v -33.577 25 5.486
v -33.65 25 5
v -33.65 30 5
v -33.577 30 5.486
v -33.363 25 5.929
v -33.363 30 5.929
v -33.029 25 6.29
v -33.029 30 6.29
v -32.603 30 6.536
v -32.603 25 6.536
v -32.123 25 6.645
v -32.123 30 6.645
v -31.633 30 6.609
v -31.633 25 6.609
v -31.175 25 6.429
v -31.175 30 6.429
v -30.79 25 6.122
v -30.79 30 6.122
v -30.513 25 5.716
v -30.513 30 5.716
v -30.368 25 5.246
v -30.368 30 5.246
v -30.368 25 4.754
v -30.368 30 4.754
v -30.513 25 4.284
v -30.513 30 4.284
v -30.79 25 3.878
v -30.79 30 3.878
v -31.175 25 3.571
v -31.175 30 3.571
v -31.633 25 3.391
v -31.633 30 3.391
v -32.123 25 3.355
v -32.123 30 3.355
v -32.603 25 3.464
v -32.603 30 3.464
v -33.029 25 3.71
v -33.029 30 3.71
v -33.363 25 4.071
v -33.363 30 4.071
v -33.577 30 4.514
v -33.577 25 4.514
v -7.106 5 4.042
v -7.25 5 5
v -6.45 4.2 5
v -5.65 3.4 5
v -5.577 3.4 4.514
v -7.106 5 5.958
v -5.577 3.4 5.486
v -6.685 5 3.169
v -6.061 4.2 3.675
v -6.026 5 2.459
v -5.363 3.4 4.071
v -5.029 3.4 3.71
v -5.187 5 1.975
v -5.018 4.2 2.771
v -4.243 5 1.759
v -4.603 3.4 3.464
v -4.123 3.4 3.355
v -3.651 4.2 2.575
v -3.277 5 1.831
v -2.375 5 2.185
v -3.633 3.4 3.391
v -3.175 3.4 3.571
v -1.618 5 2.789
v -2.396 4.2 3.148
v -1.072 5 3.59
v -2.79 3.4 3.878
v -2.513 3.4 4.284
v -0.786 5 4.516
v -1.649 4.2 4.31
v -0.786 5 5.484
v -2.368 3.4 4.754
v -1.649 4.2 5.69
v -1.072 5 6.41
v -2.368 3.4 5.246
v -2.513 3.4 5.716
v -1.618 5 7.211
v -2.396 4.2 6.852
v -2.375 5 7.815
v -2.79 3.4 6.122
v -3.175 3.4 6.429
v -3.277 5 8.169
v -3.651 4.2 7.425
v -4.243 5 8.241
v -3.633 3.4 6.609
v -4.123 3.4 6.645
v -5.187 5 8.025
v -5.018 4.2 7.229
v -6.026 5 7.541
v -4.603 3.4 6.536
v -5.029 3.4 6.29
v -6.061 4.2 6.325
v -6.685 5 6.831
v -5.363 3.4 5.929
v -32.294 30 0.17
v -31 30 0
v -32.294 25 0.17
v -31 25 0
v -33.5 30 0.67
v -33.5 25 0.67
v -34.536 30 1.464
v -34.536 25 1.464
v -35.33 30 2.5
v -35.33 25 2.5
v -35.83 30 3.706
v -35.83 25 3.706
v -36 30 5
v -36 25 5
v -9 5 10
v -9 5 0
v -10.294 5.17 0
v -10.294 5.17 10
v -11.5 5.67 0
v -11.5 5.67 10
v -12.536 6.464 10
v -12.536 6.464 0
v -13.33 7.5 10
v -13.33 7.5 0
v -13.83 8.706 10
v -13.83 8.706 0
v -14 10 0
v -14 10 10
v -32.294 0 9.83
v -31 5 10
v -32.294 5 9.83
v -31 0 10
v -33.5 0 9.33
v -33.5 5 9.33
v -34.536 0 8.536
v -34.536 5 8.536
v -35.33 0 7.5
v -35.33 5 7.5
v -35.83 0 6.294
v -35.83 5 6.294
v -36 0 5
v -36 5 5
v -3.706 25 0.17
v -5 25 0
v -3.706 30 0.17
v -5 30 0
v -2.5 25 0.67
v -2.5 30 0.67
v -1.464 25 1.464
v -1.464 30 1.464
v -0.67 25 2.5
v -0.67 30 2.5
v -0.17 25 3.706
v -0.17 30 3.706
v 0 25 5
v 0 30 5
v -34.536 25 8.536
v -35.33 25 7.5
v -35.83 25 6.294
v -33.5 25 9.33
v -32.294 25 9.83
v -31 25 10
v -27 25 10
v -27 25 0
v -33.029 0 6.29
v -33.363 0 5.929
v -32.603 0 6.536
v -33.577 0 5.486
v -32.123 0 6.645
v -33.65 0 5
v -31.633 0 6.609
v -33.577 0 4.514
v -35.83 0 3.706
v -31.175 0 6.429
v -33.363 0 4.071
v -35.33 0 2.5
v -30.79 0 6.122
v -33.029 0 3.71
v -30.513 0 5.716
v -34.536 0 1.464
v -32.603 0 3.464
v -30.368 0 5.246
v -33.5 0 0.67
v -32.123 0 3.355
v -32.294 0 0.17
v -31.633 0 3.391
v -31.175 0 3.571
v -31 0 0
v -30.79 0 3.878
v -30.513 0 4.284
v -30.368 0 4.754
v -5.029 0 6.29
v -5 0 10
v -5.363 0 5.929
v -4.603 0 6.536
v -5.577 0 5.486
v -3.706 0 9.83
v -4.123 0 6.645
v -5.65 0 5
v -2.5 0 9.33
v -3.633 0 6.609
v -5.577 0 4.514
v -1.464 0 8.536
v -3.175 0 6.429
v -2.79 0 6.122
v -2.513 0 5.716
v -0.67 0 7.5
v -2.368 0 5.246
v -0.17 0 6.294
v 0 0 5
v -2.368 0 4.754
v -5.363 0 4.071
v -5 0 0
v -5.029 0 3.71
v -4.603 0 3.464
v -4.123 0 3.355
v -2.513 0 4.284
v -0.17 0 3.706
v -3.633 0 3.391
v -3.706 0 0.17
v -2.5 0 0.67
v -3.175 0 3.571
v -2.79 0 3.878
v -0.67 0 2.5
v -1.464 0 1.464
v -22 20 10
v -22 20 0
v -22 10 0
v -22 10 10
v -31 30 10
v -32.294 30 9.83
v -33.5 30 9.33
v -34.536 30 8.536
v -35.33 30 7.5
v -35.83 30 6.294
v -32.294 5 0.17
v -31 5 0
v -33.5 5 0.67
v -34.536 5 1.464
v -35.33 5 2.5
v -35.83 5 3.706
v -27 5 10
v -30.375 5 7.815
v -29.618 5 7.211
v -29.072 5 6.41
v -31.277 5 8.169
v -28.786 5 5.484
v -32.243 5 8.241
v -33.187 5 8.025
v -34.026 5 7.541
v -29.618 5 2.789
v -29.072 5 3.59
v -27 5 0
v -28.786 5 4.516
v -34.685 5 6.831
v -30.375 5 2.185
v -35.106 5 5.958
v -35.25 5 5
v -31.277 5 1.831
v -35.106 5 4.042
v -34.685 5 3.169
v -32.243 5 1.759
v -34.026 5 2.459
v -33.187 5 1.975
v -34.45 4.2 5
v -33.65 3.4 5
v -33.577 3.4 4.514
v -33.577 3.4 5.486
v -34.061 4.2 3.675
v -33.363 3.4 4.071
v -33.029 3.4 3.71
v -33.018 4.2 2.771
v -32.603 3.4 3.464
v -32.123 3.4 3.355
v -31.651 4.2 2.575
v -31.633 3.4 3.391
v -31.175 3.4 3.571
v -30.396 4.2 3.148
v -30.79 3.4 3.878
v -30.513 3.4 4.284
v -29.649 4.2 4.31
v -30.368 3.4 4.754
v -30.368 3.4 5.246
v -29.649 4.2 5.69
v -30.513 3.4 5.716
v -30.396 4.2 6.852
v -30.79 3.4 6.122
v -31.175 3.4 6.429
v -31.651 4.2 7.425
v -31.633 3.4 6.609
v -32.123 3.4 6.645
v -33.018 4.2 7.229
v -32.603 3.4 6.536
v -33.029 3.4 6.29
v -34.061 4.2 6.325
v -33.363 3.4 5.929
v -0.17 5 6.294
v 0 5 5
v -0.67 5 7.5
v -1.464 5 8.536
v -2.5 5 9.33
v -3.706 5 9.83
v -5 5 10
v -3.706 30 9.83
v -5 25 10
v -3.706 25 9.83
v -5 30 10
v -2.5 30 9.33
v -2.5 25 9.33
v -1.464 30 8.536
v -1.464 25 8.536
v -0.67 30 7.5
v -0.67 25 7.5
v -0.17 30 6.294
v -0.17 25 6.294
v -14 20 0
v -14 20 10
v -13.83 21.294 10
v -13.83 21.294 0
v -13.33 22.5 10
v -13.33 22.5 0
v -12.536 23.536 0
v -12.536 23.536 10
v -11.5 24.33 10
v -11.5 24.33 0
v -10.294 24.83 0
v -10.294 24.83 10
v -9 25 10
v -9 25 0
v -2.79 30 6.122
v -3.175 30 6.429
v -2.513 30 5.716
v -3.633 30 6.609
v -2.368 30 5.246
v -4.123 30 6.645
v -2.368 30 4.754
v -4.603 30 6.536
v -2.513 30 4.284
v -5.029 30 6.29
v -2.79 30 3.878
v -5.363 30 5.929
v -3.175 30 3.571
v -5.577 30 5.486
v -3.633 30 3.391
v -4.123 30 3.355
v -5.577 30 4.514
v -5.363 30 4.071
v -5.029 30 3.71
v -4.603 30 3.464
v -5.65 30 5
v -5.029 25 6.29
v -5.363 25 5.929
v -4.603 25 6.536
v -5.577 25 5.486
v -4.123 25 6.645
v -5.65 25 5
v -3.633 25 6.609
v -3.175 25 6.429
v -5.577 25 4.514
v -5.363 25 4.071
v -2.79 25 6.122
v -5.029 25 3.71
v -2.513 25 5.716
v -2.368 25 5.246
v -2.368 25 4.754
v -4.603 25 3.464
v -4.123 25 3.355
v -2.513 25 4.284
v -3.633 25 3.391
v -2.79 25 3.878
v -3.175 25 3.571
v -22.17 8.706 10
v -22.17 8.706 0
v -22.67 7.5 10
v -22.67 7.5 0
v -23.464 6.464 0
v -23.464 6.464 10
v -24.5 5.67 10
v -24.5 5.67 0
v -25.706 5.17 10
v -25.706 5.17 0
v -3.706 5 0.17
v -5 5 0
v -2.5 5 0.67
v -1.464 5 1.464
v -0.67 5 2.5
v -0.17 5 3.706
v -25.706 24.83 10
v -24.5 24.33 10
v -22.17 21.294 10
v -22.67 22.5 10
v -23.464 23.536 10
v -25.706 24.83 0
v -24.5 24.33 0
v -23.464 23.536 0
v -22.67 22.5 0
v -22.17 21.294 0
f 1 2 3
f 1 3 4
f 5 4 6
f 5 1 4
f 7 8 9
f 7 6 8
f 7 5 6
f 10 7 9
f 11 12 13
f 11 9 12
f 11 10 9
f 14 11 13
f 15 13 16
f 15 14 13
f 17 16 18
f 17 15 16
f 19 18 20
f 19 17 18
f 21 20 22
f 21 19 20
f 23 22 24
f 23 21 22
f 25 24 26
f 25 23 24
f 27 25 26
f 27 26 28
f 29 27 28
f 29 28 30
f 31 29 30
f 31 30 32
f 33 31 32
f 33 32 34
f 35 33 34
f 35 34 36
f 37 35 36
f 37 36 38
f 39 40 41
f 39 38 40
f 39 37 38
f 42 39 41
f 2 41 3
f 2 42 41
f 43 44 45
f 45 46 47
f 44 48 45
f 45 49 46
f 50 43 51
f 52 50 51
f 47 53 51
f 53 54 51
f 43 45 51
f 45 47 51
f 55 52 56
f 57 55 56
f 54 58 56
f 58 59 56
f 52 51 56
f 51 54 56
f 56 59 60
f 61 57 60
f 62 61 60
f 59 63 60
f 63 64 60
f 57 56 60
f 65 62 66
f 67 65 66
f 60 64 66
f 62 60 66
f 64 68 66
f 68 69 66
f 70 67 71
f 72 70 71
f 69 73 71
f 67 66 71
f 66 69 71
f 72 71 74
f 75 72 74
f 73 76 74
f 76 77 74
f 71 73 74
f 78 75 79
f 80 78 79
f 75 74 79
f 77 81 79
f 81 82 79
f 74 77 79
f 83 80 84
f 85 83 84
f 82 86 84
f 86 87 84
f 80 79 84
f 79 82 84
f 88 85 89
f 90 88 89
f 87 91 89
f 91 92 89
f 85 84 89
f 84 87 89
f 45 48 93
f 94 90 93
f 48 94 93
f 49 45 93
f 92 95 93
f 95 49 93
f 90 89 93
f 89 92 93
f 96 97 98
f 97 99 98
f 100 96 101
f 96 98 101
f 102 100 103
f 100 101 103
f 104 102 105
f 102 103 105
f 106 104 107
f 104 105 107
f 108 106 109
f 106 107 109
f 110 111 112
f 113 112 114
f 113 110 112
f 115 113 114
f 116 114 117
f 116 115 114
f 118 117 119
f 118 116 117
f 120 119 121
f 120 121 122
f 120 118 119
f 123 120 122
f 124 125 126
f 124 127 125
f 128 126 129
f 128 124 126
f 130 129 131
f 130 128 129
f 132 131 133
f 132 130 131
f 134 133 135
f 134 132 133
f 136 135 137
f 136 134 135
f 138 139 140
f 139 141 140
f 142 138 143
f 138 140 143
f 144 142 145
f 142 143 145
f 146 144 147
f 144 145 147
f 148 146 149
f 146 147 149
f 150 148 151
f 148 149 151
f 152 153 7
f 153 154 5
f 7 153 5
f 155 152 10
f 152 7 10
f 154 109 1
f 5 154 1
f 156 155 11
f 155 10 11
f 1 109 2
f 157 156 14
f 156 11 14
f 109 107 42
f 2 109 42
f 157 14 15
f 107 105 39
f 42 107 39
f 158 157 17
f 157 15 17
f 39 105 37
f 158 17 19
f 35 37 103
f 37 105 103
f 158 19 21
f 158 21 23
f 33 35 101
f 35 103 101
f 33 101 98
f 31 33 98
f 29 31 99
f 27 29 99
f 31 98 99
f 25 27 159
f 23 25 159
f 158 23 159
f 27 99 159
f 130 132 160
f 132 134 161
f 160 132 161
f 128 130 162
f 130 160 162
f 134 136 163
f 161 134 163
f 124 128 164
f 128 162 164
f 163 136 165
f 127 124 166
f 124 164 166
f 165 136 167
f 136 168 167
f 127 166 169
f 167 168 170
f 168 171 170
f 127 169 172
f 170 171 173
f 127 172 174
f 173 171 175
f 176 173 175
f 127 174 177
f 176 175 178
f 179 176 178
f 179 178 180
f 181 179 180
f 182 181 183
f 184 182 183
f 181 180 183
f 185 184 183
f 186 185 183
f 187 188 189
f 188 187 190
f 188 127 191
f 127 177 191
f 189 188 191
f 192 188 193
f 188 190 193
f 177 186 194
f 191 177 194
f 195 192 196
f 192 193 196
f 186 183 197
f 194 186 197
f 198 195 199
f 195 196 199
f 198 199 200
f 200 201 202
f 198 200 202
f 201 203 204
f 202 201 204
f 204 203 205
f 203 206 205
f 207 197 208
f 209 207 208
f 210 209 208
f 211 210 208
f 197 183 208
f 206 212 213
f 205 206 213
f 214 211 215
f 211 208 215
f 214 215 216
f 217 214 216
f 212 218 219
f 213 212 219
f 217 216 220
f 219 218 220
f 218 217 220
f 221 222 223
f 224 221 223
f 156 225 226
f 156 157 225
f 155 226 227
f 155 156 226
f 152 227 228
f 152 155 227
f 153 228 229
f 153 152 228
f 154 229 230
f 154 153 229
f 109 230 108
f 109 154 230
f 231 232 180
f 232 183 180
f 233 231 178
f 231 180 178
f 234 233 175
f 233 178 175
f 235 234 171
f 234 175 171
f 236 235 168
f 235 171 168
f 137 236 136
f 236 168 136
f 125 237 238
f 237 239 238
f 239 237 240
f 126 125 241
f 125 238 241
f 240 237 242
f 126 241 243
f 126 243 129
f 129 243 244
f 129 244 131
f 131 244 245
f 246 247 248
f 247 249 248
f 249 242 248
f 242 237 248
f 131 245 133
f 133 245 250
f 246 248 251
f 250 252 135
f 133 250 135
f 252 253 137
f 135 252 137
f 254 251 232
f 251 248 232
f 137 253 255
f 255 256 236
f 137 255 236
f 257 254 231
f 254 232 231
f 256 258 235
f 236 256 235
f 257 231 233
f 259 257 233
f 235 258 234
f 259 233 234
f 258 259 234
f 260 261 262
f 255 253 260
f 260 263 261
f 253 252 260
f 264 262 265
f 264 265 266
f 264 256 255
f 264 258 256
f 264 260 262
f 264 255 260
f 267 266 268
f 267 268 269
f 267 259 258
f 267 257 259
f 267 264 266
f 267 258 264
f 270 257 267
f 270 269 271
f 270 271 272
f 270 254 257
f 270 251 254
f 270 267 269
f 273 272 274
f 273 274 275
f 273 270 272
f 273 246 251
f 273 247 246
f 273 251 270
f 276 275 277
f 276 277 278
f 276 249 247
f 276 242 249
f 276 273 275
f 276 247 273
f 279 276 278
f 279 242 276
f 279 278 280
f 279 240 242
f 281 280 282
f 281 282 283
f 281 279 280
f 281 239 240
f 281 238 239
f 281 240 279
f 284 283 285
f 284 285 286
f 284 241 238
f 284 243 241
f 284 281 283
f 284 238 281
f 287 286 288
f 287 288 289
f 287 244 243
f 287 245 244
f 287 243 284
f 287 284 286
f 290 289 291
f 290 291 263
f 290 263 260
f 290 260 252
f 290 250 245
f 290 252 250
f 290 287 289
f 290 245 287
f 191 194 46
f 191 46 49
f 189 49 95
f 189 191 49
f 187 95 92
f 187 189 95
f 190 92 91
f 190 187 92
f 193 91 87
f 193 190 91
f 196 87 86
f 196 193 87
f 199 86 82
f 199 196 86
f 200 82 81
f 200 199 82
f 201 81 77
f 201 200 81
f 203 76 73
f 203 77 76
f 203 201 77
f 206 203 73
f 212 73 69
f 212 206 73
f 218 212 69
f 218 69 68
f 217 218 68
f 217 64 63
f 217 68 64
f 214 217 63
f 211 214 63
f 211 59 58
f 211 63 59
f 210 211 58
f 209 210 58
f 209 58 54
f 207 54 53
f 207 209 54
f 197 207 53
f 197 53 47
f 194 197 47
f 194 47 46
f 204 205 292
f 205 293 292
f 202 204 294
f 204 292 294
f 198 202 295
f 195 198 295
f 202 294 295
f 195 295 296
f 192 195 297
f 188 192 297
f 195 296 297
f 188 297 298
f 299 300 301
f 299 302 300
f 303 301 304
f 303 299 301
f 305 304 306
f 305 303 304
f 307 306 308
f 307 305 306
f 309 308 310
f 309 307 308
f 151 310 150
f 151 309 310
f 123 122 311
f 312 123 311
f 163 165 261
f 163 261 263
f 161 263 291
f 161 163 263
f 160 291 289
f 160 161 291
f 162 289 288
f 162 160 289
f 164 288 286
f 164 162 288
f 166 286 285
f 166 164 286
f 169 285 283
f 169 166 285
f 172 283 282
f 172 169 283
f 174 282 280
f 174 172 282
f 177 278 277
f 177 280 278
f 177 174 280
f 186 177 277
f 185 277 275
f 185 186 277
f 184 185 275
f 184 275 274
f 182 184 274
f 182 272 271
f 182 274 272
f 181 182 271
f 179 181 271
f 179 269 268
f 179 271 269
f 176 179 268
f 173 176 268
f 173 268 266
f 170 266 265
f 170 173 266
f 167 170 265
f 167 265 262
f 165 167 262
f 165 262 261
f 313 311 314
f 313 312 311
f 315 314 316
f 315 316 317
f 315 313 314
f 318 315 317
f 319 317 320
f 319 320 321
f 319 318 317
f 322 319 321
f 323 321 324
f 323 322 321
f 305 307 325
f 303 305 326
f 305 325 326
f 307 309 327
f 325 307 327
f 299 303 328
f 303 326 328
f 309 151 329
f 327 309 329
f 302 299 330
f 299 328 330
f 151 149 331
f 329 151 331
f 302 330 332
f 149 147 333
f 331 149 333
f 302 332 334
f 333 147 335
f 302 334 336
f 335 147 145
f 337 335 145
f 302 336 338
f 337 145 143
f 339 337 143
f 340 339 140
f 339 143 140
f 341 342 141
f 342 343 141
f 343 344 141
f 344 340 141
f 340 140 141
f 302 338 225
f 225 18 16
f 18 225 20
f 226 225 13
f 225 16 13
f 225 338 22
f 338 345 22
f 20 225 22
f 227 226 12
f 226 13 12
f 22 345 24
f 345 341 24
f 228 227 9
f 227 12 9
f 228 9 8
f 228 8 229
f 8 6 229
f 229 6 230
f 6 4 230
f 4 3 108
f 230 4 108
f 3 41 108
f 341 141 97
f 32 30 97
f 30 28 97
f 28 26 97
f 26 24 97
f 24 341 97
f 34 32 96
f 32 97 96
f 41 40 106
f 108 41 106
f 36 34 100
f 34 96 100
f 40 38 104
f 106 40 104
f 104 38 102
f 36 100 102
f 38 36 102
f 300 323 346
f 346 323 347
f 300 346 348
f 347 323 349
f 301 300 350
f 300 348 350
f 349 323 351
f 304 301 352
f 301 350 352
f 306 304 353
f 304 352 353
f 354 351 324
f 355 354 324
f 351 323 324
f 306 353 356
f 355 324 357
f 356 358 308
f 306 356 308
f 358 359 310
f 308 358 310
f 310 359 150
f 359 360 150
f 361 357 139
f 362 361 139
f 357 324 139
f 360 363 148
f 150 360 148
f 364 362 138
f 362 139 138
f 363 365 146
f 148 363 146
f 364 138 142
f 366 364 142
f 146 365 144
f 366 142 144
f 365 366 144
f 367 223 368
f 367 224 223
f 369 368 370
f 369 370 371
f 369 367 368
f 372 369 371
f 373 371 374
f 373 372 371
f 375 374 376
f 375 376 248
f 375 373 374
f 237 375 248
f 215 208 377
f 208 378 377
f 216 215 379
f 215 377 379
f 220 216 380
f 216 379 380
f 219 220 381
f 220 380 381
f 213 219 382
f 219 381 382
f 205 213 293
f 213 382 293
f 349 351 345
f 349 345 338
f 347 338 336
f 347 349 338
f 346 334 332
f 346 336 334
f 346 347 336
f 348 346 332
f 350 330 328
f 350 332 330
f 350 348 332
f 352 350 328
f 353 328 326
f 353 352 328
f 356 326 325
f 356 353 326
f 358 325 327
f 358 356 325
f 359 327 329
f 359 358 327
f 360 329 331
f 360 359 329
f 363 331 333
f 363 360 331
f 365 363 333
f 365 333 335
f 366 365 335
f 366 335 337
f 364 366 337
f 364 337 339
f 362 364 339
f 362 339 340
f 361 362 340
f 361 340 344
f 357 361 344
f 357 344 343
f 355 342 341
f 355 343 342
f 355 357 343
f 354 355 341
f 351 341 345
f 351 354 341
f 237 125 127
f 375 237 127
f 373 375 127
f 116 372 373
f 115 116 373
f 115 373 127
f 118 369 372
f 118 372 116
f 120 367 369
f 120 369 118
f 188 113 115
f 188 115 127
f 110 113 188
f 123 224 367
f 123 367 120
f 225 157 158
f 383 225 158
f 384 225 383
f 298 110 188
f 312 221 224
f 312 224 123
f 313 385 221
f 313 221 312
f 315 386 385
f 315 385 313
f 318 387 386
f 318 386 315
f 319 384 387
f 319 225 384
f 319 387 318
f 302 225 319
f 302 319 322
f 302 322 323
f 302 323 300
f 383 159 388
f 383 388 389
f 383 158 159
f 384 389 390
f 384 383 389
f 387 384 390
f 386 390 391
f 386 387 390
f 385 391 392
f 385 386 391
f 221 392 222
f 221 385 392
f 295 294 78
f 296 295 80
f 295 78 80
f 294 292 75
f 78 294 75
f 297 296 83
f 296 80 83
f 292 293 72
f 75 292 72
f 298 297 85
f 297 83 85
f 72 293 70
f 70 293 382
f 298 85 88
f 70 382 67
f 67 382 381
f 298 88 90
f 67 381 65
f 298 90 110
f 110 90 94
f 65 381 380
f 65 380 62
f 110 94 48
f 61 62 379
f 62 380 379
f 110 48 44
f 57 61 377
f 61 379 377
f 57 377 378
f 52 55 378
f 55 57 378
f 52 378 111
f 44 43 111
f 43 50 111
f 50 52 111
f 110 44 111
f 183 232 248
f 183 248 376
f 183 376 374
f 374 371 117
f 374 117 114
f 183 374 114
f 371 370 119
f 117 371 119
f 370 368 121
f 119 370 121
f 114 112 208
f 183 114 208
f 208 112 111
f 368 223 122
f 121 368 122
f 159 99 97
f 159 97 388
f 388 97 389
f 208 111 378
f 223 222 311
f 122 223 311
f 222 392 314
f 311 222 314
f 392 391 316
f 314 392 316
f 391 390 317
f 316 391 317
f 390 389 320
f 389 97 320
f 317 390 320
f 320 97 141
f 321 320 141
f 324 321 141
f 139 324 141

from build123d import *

# Parameters (mm, degrees)
BOSS_EXTRUDE1_DEPTH     = 10
CUT_EXTRUDE1_DEPTH      = 48.916594203
CUT_EXTRUDE1_DEPTH_BACK = 48.916594203
SKETCH2_R               = 1.65
CHAMFER1_SIZE           = 1.6
FILLET1_R               = 5
FILLET2_R               = 5


with BuildPart() as part:
    # Sketch1 → Boss-Extrude1 (new body)
    with BuildSketch(Plane.XY):
        Polygon((0, 0), (0, 5), (-14, 5), (-14, 25), (0, 25), (0, 30), (-36, 30), (-36, 25), (-22, 25), (-22, 5), (-36, 5), (-36, 0), align=None)
    extrude(amount=BOSS_EXTRUDE1_DEPTH)

    # Sketch2 → Cut-Extrude1 (cut, two sides: drawn at the far end of the back side and taken through both)
    with BuildSketch(Plane(origin=(0, 30, 0), x_dir=(1, 0, 0), z_dir=(0, 1, 0)).offset(-CUT_EXTRUDE1_DEPTH_BACK)):
        with Locations(Location((-32, -5, 0), (0, 0, 180))):
            Circle(SKETCH2_R)
        with Locations(Location((-4, -5, 0), (0, 0, 180))):
            Circle(SKETCH2_R)
    extrude(amount=CUT_EXTRUDE1_DEPTH + CUT_EXTRUDE1_DEPTH_BACK, mode=Mode.SUBTRACT)

    # Chamfer1
    chamfer1_edges = [part.edges().sort_by_distance(p)[0] for p in [
        (-30.35, 5, 5),
        (-2.35, 5, 5),
    ]]
    chamfer(chamfer1_edges, length=CHAMFER1_SIZE)

    # Fillet1
    fillet1_edges = [part.edges().sort_by_distance(p)[0] for p in [
        (-22, 5, 5),
        (-22, 25, 5),
        (-14, 25, 5),
        (-14, 5, 5),
    ]]
    fillet(fillet1_edges, radius=FILLET1_R)

    # Fillet2
    fillet2_edges = [part.edges().sort_by_distance(p)[0] for p in [
        (0, 27.5, 10),
        (0, 27.5, 0),
        (0, 2.5, 0),
        (0, 2.5, 10),
        (-36, 2.5, 0),
        (-36, 2.5, 10),
        (-36, 27.5, 0),
        (-36, 27.5, 10),
    ]]
    fillet(fillet2_edges, radius=FILLET2_R - 0.0001)  # a hair under: the kernel refuses the full size


solid = part.part
